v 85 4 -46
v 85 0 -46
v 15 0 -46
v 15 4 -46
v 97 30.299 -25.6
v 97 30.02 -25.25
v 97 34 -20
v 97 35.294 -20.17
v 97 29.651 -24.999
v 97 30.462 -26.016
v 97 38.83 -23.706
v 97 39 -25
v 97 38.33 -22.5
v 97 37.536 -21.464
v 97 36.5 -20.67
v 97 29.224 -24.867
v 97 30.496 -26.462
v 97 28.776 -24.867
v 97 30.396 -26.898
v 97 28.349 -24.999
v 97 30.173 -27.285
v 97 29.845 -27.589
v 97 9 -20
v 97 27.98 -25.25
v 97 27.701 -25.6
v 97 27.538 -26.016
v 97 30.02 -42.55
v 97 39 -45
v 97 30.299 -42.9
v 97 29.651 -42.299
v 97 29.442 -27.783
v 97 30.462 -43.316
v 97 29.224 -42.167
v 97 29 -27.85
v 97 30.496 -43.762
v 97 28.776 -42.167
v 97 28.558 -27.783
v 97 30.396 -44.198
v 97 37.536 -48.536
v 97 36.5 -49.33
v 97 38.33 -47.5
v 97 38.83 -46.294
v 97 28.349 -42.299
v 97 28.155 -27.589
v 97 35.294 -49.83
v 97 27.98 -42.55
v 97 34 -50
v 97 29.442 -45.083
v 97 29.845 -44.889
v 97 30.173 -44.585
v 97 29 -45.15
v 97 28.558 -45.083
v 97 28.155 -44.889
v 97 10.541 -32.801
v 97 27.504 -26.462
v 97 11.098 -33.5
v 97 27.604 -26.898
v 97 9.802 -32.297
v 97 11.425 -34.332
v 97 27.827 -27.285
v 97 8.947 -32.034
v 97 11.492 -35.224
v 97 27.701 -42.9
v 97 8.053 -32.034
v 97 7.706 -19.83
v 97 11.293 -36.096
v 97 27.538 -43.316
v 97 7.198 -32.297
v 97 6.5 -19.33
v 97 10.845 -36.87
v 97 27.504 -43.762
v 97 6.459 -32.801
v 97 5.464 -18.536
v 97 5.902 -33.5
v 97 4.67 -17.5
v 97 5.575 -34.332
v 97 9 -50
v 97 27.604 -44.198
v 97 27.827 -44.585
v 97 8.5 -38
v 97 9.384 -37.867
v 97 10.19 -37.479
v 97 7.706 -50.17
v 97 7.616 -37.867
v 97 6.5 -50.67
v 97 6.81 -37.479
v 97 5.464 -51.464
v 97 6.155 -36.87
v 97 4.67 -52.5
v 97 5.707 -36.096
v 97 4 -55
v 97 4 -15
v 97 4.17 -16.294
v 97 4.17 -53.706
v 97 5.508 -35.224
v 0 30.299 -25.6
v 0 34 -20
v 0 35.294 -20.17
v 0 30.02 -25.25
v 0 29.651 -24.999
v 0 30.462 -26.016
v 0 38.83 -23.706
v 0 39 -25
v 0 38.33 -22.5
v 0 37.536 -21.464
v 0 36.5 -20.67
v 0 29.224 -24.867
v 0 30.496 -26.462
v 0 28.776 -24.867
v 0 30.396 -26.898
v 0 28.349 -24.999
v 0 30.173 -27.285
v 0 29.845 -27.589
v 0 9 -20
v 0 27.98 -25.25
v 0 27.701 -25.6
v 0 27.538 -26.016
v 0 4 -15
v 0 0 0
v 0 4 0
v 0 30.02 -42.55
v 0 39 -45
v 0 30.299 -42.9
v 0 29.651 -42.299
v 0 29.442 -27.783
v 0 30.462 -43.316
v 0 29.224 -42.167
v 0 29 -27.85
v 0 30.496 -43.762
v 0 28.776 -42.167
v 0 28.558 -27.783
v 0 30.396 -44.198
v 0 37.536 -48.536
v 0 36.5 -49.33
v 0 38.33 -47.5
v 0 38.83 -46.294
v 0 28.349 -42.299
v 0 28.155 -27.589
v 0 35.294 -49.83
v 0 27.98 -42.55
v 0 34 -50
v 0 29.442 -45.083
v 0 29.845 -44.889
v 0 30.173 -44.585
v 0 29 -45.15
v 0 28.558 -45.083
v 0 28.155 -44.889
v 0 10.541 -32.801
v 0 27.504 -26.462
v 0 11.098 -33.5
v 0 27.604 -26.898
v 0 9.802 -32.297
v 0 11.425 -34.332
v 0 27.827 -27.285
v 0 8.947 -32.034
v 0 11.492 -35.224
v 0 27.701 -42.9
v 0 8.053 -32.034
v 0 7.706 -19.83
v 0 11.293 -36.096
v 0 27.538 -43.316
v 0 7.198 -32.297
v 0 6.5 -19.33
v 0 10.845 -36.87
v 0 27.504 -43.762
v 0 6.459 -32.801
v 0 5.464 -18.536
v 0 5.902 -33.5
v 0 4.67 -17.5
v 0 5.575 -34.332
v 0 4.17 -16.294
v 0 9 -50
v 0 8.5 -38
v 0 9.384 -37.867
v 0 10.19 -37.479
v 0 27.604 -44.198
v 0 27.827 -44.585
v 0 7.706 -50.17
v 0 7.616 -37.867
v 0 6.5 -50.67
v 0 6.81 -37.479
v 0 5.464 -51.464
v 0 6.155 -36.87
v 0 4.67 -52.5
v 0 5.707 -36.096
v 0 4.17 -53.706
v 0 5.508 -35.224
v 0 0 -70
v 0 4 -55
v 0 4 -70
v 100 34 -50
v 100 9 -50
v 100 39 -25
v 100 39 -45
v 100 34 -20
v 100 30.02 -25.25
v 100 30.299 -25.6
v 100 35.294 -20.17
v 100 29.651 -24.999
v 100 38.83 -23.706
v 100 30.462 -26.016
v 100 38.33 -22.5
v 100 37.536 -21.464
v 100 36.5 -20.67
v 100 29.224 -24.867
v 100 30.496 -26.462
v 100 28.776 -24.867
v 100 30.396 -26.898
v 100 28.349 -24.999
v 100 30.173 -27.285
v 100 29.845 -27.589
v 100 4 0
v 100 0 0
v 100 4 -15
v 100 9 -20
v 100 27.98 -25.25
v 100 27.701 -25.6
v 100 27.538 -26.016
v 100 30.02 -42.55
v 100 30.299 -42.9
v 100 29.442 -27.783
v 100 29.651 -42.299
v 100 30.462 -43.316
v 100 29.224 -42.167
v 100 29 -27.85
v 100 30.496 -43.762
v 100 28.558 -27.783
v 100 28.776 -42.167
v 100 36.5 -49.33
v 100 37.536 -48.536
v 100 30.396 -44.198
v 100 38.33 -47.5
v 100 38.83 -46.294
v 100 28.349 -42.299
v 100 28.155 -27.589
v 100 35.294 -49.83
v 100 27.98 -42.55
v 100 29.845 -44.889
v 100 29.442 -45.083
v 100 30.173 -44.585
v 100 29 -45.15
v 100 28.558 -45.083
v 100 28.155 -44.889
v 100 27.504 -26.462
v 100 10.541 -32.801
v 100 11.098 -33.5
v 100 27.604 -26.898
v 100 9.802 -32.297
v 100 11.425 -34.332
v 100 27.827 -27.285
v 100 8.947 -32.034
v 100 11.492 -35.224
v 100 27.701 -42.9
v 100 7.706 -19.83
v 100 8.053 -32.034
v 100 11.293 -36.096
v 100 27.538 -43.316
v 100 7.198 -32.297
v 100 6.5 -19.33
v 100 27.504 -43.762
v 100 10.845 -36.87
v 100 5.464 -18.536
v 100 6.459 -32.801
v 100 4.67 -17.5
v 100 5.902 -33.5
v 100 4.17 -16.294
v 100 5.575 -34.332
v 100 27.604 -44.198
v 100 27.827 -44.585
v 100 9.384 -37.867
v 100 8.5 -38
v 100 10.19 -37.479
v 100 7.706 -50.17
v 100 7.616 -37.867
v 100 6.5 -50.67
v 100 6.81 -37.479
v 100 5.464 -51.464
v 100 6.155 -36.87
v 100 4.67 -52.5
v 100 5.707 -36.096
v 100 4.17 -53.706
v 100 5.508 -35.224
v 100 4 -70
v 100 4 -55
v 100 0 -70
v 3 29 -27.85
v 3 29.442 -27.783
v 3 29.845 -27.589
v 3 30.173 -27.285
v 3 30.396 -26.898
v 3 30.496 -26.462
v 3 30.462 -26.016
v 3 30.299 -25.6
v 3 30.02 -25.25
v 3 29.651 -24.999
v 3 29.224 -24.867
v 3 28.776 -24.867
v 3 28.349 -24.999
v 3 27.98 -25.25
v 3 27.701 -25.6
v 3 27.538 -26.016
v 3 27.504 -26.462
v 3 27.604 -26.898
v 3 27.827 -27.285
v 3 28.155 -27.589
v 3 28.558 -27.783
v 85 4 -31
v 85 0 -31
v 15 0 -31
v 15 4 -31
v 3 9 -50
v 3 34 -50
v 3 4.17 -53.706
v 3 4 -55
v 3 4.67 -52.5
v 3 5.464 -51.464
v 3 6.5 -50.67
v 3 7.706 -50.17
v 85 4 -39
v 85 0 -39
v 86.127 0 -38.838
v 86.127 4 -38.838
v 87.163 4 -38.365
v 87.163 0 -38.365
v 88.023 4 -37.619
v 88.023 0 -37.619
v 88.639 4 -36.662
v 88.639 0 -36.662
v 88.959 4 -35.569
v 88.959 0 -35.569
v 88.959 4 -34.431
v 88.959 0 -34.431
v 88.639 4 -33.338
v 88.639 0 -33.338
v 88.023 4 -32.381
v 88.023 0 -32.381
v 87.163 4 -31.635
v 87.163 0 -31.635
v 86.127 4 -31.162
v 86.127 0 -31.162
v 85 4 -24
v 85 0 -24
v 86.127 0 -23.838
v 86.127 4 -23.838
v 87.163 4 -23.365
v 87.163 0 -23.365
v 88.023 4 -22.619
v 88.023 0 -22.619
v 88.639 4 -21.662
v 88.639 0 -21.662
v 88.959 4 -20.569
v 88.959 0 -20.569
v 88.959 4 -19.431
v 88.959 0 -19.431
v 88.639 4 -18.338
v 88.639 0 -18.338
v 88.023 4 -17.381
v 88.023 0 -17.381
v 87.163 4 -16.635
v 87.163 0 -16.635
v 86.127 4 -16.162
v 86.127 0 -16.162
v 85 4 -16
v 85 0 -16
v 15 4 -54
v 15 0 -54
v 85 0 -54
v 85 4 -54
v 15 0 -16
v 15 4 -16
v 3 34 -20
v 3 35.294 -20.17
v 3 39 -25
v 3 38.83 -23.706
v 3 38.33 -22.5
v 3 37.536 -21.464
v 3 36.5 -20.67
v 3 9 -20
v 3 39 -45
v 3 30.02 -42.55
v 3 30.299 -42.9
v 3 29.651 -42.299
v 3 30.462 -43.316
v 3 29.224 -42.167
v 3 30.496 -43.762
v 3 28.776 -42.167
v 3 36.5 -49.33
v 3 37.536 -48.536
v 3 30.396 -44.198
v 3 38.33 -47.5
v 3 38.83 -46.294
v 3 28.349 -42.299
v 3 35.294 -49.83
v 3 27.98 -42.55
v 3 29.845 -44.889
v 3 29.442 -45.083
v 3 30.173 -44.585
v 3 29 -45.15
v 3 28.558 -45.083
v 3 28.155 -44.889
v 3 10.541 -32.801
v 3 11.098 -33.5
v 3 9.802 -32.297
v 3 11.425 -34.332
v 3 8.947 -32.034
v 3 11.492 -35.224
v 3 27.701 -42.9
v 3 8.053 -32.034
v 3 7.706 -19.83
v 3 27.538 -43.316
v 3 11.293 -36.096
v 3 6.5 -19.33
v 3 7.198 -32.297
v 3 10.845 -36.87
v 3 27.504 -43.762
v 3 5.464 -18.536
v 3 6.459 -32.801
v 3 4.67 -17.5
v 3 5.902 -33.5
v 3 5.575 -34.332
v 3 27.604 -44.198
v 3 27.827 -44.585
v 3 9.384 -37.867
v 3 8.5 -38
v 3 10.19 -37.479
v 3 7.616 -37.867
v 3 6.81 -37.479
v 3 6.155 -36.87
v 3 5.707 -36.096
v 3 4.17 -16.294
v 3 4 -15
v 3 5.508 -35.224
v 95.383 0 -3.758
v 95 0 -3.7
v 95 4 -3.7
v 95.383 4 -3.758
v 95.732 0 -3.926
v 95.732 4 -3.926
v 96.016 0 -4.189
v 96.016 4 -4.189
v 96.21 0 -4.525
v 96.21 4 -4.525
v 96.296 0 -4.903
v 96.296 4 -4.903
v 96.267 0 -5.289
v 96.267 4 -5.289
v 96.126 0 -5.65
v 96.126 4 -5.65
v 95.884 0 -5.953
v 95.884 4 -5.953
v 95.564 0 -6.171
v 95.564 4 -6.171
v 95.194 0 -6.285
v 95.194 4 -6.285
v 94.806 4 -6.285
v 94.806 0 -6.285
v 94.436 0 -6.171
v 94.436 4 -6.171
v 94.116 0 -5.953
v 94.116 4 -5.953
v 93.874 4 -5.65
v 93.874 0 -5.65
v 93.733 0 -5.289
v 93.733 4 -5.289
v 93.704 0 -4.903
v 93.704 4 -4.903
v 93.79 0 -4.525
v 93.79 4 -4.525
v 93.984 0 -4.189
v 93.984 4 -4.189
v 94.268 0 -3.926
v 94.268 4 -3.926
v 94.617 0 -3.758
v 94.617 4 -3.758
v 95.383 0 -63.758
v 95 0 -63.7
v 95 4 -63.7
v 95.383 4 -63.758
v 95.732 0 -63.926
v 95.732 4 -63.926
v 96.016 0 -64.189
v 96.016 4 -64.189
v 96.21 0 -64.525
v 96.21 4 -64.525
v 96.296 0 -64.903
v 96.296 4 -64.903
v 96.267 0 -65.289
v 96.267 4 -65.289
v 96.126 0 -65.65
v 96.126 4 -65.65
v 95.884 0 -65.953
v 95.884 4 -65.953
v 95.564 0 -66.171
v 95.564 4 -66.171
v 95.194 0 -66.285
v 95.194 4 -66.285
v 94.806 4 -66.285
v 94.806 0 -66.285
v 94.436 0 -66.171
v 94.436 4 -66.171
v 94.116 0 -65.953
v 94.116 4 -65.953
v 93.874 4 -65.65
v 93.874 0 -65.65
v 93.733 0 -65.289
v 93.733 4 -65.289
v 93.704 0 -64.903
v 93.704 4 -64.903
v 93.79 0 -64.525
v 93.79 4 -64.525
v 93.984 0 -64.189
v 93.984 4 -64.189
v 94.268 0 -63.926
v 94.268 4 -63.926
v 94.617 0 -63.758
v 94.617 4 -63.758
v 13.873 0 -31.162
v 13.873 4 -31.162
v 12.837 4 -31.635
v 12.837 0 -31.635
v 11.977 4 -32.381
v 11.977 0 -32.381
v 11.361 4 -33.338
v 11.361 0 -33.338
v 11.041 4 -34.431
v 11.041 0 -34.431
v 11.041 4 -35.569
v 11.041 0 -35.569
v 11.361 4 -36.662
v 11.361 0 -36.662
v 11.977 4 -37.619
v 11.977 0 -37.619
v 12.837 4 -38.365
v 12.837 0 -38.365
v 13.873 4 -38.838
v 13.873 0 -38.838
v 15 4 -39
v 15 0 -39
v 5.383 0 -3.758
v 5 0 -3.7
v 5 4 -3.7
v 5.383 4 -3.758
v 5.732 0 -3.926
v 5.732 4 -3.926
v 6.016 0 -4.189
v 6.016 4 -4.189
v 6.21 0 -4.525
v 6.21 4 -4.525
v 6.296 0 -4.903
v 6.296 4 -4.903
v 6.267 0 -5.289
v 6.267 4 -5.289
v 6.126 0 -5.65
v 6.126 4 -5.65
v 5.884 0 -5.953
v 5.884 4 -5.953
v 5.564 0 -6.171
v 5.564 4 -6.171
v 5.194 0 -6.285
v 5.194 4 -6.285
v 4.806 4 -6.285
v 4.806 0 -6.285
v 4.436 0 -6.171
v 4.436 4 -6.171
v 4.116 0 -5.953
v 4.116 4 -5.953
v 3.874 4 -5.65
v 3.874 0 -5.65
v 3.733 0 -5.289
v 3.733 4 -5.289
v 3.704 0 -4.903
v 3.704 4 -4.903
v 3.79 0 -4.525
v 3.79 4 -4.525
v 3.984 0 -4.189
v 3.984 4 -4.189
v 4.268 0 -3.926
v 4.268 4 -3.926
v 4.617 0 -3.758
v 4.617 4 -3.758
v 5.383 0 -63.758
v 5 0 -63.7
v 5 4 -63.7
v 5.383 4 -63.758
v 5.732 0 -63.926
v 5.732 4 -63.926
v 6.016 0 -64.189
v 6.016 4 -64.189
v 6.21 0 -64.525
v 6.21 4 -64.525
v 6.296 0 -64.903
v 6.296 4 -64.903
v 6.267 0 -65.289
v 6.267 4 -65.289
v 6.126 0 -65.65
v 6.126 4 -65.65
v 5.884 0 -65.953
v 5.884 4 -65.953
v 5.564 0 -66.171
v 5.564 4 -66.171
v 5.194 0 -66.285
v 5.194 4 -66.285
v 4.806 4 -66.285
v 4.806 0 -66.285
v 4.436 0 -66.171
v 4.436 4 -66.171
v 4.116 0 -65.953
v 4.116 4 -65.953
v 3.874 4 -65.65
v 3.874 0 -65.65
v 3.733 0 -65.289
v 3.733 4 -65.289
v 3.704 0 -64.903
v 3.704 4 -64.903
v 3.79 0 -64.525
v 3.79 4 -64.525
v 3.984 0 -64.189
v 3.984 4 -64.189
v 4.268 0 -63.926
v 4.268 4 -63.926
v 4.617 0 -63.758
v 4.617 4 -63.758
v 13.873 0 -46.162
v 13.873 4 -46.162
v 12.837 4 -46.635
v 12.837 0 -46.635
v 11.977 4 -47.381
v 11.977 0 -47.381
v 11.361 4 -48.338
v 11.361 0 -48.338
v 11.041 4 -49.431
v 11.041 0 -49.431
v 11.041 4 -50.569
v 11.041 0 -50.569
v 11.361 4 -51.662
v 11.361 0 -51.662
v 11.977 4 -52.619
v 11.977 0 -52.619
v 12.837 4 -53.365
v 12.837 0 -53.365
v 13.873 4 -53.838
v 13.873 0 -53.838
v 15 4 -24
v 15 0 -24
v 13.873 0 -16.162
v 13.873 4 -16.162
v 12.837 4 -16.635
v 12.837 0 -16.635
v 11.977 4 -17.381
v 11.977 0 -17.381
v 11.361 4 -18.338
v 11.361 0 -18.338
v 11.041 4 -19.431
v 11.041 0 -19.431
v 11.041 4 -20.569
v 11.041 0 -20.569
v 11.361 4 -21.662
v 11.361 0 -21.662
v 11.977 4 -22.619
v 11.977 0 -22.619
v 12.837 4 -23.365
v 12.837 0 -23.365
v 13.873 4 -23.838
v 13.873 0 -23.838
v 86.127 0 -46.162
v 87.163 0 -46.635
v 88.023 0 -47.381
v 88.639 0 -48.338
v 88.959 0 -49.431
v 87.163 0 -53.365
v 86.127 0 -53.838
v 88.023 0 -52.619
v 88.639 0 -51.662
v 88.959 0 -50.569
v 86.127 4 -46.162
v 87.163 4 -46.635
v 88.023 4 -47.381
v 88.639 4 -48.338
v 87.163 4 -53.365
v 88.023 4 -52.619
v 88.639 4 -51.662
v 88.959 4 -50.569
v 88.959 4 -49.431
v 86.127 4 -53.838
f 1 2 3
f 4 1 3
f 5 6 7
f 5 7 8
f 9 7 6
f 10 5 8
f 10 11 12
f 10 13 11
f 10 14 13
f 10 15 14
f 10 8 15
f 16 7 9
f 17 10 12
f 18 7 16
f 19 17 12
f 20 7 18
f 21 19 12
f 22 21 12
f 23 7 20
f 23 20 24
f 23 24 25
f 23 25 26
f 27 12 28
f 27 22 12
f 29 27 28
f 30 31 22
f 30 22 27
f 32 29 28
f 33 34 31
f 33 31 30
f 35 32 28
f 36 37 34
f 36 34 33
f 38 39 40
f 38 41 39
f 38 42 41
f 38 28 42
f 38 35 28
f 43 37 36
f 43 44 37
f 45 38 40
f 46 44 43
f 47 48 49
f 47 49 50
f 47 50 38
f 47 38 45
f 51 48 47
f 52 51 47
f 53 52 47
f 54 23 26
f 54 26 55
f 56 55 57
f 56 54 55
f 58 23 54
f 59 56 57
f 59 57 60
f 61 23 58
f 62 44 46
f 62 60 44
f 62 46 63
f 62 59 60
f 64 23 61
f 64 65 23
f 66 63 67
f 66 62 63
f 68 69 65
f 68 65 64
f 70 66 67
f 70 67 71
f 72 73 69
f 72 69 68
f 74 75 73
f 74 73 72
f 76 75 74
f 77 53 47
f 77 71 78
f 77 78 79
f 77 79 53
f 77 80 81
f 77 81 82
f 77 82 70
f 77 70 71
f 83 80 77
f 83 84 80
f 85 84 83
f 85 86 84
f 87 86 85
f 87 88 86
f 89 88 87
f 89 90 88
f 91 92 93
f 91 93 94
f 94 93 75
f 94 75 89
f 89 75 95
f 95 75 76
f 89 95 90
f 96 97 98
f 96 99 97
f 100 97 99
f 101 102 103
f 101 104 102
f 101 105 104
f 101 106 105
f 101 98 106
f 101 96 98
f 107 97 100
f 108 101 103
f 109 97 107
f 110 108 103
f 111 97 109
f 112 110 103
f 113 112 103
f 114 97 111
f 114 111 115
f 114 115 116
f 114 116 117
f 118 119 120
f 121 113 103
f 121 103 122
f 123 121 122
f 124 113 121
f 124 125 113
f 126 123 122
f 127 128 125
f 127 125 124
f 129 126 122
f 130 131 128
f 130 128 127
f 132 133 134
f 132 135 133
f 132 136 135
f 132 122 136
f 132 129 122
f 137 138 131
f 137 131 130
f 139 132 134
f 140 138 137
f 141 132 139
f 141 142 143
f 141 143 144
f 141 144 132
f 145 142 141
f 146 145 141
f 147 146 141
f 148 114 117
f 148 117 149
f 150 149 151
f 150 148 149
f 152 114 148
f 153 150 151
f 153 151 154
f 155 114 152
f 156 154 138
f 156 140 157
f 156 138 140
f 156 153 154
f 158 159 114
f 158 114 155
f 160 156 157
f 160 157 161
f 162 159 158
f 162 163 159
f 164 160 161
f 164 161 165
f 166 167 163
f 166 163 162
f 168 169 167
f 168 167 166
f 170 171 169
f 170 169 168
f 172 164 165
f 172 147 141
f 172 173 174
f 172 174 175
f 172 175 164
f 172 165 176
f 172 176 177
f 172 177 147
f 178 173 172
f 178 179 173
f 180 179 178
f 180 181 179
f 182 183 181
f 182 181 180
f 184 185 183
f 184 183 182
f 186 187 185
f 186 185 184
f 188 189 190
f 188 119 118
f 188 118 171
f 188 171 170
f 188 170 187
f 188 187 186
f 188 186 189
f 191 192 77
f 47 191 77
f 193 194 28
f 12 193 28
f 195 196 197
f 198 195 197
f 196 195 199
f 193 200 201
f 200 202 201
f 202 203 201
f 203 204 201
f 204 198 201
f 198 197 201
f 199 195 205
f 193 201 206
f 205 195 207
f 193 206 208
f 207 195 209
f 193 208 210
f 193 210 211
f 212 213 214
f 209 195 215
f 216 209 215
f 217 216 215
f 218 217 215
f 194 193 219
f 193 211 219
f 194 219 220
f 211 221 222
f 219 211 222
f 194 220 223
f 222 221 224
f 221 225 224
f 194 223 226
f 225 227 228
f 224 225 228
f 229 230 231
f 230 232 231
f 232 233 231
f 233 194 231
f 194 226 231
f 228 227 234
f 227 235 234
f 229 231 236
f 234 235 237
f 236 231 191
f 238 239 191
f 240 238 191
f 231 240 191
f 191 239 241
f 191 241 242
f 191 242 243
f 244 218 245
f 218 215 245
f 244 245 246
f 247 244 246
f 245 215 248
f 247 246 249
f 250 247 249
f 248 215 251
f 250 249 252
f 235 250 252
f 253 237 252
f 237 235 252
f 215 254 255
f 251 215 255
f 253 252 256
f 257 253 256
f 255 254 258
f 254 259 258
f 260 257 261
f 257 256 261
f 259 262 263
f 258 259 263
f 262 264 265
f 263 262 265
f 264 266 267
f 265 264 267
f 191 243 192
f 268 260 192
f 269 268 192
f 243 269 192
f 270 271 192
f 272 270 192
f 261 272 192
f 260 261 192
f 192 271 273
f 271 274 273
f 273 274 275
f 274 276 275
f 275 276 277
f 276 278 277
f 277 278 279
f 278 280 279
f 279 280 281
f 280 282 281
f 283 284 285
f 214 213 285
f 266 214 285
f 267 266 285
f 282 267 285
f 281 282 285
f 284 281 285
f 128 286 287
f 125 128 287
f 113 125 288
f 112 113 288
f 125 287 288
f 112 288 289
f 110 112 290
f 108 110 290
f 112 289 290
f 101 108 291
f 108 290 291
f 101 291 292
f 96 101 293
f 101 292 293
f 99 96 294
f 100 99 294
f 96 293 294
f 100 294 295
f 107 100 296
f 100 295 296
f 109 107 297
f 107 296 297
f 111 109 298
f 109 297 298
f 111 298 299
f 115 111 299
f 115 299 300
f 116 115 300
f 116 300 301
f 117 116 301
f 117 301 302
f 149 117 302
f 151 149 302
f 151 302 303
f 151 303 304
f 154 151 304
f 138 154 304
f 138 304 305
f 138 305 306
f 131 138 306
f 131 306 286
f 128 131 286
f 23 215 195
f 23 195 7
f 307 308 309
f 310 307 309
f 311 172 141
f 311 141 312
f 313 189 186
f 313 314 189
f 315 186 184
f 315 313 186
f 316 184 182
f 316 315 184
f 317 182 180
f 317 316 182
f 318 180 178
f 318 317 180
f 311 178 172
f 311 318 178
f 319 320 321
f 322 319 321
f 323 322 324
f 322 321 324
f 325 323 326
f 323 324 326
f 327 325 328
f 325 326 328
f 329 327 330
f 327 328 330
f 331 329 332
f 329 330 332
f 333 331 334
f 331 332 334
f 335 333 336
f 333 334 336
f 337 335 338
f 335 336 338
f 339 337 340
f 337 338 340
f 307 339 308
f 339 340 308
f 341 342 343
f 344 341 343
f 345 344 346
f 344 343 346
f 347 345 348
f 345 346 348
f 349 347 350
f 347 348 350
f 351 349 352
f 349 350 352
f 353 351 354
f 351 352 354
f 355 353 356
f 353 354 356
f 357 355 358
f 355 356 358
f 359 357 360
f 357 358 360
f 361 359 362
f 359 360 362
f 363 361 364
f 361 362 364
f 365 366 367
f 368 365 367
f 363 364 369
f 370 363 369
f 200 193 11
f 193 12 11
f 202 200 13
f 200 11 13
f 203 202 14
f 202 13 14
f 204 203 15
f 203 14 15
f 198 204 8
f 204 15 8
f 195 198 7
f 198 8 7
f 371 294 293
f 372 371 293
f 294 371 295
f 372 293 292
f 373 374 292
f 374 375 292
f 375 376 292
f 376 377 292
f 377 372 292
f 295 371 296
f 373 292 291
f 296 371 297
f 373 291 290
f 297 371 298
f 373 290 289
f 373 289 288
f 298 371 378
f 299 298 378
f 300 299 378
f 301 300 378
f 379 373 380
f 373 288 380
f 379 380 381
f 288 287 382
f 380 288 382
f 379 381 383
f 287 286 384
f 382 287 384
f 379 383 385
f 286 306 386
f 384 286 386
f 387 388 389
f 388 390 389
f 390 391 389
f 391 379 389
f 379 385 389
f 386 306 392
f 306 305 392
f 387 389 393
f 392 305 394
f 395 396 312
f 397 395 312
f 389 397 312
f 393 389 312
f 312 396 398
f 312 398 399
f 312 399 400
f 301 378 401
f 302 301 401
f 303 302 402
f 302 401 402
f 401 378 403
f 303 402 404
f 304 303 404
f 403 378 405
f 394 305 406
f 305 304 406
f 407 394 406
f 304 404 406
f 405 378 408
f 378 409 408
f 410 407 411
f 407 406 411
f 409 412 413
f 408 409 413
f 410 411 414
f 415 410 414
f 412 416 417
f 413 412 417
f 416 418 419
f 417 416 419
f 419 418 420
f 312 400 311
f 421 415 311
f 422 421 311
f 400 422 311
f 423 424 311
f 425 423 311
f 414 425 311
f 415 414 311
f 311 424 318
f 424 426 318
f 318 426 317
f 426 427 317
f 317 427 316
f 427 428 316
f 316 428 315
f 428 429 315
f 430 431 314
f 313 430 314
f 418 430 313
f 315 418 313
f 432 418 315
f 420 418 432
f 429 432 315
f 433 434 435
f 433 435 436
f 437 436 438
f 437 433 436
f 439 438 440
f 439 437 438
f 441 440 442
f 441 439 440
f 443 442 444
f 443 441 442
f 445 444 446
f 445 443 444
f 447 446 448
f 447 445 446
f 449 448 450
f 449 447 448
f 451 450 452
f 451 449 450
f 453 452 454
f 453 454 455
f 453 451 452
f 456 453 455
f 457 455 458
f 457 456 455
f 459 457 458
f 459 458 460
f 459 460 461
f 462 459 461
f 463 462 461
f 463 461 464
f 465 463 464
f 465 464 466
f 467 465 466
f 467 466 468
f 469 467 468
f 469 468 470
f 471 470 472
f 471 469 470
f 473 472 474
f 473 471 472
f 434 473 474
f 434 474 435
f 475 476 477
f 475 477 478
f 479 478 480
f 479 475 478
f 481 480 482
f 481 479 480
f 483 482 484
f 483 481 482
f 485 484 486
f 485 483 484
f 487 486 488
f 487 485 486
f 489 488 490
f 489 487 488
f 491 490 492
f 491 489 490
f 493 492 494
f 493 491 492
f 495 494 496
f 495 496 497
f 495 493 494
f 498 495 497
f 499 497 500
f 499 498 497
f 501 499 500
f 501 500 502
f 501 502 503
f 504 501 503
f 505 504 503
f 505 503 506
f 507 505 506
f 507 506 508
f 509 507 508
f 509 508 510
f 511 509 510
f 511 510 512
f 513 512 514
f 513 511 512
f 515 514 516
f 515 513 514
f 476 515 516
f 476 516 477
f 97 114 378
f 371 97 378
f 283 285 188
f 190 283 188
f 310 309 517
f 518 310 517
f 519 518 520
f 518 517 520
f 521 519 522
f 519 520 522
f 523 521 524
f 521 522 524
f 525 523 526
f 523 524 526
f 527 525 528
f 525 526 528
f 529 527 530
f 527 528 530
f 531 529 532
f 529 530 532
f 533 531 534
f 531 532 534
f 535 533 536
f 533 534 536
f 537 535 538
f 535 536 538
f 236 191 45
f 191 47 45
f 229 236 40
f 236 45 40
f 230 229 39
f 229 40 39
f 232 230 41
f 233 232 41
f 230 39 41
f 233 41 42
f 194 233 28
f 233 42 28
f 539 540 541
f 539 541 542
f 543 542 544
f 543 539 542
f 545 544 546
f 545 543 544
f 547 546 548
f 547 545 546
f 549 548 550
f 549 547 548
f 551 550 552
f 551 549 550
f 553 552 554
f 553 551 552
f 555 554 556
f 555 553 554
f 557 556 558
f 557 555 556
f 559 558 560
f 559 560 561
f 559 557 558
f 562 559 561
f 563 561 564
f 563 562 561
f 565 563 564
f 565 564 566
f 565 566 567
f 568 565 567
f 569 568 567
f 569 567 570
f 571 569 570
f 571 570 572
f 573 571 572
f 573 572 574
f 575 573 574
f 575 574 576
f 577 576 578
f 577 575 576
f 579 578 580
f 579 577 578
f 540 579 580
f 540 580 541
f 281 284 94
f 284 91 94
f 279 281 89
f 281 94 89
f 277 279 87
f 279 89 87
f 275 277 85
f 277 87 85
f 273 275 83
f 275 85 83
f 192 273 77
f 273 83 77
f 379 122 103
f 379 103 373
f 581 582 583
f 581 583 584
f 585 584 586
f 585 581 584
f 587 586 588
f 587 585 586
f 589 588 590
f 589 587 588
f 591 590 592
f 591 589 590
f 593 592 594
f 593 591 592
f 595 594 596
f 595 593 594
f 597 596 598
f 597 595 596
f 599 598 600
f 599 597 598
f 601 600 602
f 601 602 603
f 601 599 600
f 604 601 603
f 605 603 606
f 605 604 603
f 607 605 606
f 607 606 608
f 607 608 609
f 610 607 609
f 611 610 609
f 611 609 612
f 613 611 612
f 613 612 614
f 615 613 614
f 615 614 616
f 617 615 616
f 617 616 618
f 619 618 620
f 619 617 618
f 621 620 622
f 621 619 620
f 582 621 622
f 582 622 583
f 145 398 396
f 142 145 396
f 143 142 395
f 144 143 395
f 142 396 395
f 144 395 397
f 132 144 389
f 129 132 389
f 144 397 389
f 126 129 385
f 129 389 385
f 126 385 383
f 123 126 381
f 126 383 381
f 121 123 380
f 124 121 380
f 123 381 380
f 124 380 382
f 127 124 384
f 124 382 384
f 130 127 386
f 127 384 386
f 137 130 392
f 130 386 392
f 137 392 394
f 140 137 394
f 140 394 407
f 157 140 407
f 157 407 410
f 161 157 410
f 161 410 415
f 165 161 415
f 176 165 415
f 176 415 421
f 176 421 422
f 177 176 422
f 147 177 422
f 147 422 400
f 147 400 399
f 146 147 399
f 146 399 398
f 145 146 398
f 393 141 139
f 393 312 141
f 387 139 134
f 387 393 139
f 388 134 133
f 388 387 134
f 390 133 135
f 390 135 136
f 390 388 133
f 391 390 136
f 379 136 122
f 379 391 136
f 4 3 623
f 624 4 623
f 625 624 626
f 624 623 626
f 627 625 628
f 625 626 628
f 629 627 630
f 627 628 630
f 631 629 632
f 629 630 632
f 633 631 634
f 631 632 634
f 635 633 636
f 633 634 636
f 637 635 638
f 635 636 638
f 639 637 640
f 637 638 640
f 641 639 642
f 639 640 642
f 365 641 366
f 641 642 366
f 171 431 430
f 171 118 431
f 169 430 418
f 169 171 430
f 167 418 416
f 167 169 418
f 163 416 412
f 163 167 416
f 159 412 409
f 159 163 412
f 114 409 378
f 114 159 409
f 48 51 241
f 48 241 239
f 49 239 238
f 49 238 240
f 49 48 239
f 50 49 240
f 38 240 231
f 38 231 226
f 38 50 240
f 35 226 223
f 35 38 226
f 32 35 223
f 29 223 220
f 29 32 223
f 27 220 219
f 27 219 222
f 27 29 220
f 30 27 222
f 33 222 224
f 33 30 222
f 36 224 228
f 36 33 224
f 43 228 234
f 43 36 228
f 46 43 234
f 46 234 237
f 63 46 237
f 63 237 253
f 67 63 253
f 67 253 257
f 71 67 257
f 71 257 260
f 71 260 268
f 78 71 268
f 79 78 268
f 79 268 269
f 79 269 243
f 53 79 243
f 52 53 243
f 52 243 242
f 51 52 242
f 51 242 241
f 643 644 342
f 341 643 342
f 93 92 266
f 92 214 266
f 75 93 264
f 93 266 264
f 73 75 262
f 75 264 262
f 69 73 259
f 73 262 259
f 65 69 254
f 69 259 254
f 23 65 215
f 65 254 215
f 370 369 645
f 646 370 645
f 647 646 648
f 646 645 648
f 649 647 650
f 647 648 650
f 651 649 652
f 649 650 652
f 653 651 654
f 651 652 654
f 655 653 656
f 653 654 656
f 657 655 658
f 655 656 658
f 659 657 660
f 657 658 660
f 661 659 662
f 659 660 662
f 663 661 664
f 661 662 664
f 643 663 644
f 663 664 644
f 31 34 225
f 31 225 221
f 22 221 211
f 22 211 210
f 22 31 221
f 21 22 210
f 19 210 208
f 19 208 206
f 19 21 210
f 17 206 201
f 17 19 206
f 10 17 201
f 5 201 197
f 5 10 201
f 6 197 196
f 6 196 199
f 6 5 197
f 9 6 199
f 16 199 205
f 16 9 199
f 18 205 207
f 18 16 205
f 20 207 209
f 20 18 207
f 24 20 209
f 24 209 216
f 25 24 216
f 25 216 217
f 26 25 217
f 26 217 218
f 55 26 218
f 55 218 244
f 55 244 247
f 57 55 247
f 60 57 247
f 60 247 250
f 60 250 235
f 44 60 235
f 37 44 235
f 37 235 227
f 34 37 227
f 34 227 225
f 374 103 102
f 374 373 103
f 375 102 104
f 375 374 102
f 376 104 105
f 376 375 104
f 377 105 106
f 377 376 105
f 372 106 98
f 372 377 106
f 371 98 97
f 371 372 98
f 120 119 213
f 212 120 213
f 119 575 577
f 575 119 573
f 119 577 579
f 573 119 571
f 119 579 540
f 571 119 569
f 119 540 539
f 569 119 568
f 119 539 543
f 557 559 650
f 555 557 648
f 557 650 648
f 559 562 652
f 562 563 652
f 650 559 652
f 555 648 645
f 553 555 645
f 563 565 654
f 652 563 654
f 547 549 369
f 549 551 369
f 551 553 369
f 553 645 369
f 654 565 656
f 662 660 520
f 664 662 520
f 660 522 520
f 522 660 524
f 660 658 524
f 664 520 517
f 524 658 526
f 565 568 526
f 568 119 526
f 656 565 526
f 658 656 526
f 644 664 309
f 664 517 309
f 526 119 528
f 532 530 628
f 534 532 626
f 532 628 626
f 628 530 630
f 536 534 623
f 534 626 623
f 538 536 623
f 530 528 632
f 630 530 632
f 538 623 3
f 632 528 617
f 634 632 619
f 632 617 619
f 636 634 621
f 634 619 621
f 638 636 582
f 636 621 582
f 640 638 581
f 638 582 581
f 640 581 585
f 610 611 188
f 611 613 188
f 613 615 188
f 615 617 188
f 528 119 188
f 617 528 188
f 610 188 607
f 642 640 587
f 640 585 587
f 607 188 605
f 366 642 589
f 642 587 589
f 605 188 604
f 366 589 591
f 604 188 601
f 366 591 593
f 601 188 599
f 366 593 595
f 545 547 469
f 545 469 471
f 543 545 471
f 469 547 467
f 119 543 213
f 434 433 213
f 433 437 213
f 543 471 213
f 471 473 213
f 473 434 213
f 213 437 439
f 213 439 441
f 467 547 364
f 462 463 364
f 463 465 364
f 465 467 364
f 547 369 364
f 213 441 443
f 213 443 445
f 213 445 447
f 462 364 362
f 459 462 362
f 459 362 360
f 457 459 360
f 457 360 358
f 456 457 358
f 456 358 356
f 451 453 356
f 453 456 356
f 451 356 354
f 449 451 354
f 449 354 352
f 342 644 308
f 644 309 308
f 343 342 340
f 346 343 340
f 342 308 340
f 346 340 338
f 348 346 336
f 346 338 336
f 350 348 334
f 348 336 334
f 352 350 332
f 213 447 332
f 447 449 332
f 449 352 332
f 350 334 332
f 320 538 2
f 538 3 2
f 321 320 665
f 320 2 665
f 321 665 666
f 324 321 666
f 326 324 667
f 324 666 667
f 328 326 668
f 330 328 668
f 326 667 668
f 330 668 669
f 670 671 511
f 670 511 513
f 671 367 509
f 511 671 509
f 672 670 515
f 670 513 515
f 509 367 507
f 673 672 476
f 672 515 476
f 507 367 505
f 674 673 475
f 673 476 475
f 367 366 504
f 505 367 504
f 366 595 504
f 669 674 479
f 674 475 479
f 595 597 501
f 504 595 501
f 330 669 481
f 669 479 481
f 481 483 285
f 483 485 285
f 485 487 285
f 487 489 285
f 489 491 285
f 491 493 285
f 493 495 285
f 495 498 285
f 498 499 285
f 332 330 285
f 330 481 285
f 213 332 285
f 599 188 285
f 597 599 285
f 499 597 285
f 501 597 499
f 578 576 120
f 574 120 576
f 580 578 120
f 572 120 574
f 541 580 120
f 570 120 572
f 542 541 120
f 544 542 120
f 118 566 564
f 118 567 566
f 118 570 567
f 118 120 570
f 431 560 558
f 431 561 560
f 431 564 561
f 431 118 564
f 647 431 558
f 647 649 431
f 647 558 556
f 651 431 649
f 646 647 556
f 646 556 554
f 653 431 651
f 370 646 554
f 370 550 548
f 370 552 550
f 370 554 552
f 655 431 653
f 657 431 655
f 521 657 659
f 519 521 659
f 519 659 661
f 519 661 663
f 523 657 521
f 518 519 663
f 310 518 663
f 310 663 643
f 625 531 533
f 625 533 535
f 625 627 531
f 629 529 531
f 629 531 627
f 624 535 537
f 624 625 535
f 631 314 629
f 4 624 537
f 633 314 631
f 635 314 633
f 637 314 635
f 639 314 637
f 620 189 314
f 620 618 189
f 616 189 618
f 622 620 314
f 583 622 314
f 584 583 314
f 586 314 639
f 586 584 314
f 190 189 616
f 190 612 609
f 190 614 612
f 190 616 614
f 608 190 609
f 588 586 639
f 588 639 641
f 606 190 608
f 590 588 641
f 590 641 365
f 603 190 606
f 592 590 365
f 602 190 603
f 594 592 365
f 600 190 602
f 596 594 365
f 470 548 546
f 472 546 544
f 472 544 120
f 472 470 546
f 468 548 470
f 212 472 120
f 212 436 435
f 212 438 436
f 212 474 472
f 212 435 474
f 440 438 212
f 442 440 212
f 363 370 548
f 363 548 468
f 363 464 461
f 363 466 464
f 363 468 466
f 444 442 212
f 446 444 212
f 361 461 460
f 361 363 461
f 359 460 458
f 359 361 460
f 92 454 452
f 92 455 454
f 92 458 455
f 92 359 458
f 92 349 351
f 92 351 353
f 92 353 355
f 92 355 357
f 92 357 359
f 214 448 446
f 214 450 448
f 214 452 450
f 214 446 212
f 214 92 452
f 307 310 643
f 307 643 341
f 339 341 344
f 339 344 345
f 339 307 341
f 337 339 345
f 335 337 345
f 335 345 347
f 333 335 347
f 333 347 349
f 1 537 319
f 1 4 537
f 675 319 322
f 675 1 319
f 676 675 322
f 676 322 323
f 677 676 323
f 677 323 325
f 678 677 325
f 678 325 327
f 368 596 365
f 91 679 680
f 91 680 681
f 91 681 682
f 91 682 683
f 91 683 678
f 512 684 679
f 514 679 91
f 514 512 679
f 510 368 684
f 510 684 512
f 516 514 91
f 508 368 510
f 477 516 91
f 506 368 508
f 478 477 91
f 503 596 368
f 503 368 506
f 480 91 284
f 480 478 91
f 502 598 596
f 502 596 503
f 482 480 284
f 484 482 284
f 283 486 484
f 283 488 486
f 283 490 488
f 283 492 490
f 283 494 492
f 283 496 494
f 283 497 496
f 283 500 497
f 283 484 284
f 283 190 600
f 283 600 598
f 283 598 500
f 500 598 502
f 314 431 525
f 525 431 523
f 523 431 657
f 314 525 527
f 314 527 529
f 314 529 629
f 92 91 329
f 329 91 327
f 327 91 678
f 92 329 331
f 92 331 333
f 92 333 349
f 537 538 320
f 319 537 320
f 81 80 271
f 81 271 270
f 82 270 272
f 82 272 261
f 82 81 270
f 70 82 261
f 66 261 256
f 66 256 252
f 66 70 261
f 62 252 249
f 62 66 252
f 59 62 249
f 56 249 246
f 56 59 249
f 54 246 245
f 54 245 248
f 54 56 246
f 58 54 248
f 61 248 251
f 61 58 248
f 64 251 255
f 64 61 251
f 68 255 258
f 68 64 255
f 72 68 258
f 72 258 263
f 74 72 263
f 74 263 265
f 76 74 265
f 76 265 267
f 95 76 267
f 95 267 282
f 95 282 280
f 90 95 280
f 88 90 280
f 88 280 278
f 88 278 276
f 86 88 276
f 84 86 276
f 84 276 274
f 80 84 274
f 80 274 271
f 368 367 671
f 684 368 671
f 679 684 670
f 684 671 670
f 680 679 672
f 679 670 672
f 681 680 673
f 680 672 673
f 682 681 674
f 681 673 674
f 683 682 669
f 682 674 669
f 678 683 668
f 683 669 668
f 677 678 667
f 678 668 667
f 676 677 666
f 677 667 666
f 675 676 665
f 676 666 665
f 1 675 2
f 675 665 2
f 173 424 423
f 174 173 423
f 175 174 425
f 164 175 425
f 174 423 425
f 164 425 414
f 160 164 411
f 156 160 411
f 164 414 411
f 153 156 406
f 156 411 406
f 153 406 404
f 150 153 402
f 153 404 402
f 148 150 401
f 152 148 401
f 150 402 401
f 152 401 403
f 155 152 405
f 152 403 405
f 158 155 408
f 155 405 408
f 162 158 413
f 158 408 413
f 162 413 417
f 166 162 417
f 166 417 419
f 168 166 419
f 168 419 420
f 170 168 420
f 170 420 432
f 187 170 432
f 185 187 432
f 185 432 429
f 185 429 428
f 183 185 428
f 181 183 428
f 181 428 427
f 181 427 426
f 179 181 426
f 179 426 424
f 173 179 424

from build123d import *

# Parameters (mm, degrees)
SKETCH1_R            = 1.3
BOSS_EXTRUDE10_DEPTH = 4
SKETCH1_22_W         = 3
SKETCH1_22_H         = 30
BOSS_EXTRUDE11_DEPTH = 39
FILLET4_R            = 5
SKETCH4_R            = 1.5
SKETCH4_R_2          = 3
CUT_EXTRUDE19_DEPTH  = 126.8173279


with BuildPart() as part:
    # Sketch1 → Boss-Extrude10 (new body)
    with BuildSketch(Plane(origin=(0, 0, 0), x_dir=(1, 0, 0), z_dir=(0, 1, 0))):
        Polygon((0, 70), (0, 50), (3, 50), (3, 20), (0, 20), (0, 0), (100, 0), (100, 70), align=None)
        with Locations((5, 5)):
            Circle(SKETCH1_R, mode=Mode.SUBTRACT)
        with Locations((95, 5)):
            Circle(SKETCH1_R, mode=Mode.SUBTRACT)
        with BuildLine():
            ThreePointArc((15, 16), (11, 20), (15, 24))
            Line((15, 24), (85, 24))
            ThreePointArc((85, 24), (89, 20), (85, 16))
            Line((85, 16), (15, 16))
        make_face(mode=Mode.SUBTRACT)
        with Locations((5, 65)):
            Circle(SKETCH1_R, mode=Mode.SUBTRACT)
        with BuildLine():
            ThreePointArc((15, 31), (11, 35), (15, 39))
            Line((15, 39), (85, 39))
            ThreePointArc((85, 39), (89, 35), (85, 31))
            Line((85, 31), (15, 31))
        make_face(mode=Mode.SUBTRACT)
        with BuildLine():
            ThreePointArc((15, 46), (11, 50), (15, 54))
            Line((15, 54), (85, 54))
            ThreePointArc((85, 54), (89, 50), (85, 46))
            Line((85, 46), (15, 46))
        make_face(mode=Mode.SUBTRACT)
        with Locations((95, 65)):
            Circle(SKETCH1_R, mode=Mode.SUBTRACT)
    extrude(amount=BOSS_EXTRUDE10_DEPTH)

    # Sketch1<22> → Boss-Extrude11 (add)
    with BuildSketch(Plane(origin=(0, 0, 0), x_dir=(1, 0, 0), z_dir=(0, 1, 0))):
        with Locations((1.5, 35)):
            Rectangle(SKETCH1_22_W, SKETCH1_22_H)
    extrude(amount=BOSS_EXTRUDE11_DEPTH)

    # Fillet4
    fillet4_edges = [part.edges().sort_by_distance(p)[0] for p in [
        (1.5, 4, -50),
        (1.5, 39, -50),
        (1.5, 4, -20),
        (1.5, 39, -20),
    ]]
    fillet(fillet4_edges, radius=FILLET4_R)

    # Sketch4 → Cut-Extrude19 (cut, through all)
    with BuildSketch(Plane(origin=(3, 0, 0), x_dir=(0, 0, -1), z_dir=(1, 0, 0))):
        with Locations((26.35, 29)):
            Circle(SKETCH4_R)
        with Locations((43.65, 29)):
            Circle(SKETCH4_R)
        with Locations((35, 8.5)):
            Circle(SKETCH4_R_2)
    extrude(amount=-CUT_EXTRUDE19_DEPTH, mode=Mode.SUBTRACT)

    # Mirror7: part across plane


with BuildPart() as part_1:
    add(part.part)
    add(part.part.mirror(Plane(origin=(50, 0, 0), x_dir=(0, 0, 1), z_dir=(1, 0, 0))))


solid = part_1.part
